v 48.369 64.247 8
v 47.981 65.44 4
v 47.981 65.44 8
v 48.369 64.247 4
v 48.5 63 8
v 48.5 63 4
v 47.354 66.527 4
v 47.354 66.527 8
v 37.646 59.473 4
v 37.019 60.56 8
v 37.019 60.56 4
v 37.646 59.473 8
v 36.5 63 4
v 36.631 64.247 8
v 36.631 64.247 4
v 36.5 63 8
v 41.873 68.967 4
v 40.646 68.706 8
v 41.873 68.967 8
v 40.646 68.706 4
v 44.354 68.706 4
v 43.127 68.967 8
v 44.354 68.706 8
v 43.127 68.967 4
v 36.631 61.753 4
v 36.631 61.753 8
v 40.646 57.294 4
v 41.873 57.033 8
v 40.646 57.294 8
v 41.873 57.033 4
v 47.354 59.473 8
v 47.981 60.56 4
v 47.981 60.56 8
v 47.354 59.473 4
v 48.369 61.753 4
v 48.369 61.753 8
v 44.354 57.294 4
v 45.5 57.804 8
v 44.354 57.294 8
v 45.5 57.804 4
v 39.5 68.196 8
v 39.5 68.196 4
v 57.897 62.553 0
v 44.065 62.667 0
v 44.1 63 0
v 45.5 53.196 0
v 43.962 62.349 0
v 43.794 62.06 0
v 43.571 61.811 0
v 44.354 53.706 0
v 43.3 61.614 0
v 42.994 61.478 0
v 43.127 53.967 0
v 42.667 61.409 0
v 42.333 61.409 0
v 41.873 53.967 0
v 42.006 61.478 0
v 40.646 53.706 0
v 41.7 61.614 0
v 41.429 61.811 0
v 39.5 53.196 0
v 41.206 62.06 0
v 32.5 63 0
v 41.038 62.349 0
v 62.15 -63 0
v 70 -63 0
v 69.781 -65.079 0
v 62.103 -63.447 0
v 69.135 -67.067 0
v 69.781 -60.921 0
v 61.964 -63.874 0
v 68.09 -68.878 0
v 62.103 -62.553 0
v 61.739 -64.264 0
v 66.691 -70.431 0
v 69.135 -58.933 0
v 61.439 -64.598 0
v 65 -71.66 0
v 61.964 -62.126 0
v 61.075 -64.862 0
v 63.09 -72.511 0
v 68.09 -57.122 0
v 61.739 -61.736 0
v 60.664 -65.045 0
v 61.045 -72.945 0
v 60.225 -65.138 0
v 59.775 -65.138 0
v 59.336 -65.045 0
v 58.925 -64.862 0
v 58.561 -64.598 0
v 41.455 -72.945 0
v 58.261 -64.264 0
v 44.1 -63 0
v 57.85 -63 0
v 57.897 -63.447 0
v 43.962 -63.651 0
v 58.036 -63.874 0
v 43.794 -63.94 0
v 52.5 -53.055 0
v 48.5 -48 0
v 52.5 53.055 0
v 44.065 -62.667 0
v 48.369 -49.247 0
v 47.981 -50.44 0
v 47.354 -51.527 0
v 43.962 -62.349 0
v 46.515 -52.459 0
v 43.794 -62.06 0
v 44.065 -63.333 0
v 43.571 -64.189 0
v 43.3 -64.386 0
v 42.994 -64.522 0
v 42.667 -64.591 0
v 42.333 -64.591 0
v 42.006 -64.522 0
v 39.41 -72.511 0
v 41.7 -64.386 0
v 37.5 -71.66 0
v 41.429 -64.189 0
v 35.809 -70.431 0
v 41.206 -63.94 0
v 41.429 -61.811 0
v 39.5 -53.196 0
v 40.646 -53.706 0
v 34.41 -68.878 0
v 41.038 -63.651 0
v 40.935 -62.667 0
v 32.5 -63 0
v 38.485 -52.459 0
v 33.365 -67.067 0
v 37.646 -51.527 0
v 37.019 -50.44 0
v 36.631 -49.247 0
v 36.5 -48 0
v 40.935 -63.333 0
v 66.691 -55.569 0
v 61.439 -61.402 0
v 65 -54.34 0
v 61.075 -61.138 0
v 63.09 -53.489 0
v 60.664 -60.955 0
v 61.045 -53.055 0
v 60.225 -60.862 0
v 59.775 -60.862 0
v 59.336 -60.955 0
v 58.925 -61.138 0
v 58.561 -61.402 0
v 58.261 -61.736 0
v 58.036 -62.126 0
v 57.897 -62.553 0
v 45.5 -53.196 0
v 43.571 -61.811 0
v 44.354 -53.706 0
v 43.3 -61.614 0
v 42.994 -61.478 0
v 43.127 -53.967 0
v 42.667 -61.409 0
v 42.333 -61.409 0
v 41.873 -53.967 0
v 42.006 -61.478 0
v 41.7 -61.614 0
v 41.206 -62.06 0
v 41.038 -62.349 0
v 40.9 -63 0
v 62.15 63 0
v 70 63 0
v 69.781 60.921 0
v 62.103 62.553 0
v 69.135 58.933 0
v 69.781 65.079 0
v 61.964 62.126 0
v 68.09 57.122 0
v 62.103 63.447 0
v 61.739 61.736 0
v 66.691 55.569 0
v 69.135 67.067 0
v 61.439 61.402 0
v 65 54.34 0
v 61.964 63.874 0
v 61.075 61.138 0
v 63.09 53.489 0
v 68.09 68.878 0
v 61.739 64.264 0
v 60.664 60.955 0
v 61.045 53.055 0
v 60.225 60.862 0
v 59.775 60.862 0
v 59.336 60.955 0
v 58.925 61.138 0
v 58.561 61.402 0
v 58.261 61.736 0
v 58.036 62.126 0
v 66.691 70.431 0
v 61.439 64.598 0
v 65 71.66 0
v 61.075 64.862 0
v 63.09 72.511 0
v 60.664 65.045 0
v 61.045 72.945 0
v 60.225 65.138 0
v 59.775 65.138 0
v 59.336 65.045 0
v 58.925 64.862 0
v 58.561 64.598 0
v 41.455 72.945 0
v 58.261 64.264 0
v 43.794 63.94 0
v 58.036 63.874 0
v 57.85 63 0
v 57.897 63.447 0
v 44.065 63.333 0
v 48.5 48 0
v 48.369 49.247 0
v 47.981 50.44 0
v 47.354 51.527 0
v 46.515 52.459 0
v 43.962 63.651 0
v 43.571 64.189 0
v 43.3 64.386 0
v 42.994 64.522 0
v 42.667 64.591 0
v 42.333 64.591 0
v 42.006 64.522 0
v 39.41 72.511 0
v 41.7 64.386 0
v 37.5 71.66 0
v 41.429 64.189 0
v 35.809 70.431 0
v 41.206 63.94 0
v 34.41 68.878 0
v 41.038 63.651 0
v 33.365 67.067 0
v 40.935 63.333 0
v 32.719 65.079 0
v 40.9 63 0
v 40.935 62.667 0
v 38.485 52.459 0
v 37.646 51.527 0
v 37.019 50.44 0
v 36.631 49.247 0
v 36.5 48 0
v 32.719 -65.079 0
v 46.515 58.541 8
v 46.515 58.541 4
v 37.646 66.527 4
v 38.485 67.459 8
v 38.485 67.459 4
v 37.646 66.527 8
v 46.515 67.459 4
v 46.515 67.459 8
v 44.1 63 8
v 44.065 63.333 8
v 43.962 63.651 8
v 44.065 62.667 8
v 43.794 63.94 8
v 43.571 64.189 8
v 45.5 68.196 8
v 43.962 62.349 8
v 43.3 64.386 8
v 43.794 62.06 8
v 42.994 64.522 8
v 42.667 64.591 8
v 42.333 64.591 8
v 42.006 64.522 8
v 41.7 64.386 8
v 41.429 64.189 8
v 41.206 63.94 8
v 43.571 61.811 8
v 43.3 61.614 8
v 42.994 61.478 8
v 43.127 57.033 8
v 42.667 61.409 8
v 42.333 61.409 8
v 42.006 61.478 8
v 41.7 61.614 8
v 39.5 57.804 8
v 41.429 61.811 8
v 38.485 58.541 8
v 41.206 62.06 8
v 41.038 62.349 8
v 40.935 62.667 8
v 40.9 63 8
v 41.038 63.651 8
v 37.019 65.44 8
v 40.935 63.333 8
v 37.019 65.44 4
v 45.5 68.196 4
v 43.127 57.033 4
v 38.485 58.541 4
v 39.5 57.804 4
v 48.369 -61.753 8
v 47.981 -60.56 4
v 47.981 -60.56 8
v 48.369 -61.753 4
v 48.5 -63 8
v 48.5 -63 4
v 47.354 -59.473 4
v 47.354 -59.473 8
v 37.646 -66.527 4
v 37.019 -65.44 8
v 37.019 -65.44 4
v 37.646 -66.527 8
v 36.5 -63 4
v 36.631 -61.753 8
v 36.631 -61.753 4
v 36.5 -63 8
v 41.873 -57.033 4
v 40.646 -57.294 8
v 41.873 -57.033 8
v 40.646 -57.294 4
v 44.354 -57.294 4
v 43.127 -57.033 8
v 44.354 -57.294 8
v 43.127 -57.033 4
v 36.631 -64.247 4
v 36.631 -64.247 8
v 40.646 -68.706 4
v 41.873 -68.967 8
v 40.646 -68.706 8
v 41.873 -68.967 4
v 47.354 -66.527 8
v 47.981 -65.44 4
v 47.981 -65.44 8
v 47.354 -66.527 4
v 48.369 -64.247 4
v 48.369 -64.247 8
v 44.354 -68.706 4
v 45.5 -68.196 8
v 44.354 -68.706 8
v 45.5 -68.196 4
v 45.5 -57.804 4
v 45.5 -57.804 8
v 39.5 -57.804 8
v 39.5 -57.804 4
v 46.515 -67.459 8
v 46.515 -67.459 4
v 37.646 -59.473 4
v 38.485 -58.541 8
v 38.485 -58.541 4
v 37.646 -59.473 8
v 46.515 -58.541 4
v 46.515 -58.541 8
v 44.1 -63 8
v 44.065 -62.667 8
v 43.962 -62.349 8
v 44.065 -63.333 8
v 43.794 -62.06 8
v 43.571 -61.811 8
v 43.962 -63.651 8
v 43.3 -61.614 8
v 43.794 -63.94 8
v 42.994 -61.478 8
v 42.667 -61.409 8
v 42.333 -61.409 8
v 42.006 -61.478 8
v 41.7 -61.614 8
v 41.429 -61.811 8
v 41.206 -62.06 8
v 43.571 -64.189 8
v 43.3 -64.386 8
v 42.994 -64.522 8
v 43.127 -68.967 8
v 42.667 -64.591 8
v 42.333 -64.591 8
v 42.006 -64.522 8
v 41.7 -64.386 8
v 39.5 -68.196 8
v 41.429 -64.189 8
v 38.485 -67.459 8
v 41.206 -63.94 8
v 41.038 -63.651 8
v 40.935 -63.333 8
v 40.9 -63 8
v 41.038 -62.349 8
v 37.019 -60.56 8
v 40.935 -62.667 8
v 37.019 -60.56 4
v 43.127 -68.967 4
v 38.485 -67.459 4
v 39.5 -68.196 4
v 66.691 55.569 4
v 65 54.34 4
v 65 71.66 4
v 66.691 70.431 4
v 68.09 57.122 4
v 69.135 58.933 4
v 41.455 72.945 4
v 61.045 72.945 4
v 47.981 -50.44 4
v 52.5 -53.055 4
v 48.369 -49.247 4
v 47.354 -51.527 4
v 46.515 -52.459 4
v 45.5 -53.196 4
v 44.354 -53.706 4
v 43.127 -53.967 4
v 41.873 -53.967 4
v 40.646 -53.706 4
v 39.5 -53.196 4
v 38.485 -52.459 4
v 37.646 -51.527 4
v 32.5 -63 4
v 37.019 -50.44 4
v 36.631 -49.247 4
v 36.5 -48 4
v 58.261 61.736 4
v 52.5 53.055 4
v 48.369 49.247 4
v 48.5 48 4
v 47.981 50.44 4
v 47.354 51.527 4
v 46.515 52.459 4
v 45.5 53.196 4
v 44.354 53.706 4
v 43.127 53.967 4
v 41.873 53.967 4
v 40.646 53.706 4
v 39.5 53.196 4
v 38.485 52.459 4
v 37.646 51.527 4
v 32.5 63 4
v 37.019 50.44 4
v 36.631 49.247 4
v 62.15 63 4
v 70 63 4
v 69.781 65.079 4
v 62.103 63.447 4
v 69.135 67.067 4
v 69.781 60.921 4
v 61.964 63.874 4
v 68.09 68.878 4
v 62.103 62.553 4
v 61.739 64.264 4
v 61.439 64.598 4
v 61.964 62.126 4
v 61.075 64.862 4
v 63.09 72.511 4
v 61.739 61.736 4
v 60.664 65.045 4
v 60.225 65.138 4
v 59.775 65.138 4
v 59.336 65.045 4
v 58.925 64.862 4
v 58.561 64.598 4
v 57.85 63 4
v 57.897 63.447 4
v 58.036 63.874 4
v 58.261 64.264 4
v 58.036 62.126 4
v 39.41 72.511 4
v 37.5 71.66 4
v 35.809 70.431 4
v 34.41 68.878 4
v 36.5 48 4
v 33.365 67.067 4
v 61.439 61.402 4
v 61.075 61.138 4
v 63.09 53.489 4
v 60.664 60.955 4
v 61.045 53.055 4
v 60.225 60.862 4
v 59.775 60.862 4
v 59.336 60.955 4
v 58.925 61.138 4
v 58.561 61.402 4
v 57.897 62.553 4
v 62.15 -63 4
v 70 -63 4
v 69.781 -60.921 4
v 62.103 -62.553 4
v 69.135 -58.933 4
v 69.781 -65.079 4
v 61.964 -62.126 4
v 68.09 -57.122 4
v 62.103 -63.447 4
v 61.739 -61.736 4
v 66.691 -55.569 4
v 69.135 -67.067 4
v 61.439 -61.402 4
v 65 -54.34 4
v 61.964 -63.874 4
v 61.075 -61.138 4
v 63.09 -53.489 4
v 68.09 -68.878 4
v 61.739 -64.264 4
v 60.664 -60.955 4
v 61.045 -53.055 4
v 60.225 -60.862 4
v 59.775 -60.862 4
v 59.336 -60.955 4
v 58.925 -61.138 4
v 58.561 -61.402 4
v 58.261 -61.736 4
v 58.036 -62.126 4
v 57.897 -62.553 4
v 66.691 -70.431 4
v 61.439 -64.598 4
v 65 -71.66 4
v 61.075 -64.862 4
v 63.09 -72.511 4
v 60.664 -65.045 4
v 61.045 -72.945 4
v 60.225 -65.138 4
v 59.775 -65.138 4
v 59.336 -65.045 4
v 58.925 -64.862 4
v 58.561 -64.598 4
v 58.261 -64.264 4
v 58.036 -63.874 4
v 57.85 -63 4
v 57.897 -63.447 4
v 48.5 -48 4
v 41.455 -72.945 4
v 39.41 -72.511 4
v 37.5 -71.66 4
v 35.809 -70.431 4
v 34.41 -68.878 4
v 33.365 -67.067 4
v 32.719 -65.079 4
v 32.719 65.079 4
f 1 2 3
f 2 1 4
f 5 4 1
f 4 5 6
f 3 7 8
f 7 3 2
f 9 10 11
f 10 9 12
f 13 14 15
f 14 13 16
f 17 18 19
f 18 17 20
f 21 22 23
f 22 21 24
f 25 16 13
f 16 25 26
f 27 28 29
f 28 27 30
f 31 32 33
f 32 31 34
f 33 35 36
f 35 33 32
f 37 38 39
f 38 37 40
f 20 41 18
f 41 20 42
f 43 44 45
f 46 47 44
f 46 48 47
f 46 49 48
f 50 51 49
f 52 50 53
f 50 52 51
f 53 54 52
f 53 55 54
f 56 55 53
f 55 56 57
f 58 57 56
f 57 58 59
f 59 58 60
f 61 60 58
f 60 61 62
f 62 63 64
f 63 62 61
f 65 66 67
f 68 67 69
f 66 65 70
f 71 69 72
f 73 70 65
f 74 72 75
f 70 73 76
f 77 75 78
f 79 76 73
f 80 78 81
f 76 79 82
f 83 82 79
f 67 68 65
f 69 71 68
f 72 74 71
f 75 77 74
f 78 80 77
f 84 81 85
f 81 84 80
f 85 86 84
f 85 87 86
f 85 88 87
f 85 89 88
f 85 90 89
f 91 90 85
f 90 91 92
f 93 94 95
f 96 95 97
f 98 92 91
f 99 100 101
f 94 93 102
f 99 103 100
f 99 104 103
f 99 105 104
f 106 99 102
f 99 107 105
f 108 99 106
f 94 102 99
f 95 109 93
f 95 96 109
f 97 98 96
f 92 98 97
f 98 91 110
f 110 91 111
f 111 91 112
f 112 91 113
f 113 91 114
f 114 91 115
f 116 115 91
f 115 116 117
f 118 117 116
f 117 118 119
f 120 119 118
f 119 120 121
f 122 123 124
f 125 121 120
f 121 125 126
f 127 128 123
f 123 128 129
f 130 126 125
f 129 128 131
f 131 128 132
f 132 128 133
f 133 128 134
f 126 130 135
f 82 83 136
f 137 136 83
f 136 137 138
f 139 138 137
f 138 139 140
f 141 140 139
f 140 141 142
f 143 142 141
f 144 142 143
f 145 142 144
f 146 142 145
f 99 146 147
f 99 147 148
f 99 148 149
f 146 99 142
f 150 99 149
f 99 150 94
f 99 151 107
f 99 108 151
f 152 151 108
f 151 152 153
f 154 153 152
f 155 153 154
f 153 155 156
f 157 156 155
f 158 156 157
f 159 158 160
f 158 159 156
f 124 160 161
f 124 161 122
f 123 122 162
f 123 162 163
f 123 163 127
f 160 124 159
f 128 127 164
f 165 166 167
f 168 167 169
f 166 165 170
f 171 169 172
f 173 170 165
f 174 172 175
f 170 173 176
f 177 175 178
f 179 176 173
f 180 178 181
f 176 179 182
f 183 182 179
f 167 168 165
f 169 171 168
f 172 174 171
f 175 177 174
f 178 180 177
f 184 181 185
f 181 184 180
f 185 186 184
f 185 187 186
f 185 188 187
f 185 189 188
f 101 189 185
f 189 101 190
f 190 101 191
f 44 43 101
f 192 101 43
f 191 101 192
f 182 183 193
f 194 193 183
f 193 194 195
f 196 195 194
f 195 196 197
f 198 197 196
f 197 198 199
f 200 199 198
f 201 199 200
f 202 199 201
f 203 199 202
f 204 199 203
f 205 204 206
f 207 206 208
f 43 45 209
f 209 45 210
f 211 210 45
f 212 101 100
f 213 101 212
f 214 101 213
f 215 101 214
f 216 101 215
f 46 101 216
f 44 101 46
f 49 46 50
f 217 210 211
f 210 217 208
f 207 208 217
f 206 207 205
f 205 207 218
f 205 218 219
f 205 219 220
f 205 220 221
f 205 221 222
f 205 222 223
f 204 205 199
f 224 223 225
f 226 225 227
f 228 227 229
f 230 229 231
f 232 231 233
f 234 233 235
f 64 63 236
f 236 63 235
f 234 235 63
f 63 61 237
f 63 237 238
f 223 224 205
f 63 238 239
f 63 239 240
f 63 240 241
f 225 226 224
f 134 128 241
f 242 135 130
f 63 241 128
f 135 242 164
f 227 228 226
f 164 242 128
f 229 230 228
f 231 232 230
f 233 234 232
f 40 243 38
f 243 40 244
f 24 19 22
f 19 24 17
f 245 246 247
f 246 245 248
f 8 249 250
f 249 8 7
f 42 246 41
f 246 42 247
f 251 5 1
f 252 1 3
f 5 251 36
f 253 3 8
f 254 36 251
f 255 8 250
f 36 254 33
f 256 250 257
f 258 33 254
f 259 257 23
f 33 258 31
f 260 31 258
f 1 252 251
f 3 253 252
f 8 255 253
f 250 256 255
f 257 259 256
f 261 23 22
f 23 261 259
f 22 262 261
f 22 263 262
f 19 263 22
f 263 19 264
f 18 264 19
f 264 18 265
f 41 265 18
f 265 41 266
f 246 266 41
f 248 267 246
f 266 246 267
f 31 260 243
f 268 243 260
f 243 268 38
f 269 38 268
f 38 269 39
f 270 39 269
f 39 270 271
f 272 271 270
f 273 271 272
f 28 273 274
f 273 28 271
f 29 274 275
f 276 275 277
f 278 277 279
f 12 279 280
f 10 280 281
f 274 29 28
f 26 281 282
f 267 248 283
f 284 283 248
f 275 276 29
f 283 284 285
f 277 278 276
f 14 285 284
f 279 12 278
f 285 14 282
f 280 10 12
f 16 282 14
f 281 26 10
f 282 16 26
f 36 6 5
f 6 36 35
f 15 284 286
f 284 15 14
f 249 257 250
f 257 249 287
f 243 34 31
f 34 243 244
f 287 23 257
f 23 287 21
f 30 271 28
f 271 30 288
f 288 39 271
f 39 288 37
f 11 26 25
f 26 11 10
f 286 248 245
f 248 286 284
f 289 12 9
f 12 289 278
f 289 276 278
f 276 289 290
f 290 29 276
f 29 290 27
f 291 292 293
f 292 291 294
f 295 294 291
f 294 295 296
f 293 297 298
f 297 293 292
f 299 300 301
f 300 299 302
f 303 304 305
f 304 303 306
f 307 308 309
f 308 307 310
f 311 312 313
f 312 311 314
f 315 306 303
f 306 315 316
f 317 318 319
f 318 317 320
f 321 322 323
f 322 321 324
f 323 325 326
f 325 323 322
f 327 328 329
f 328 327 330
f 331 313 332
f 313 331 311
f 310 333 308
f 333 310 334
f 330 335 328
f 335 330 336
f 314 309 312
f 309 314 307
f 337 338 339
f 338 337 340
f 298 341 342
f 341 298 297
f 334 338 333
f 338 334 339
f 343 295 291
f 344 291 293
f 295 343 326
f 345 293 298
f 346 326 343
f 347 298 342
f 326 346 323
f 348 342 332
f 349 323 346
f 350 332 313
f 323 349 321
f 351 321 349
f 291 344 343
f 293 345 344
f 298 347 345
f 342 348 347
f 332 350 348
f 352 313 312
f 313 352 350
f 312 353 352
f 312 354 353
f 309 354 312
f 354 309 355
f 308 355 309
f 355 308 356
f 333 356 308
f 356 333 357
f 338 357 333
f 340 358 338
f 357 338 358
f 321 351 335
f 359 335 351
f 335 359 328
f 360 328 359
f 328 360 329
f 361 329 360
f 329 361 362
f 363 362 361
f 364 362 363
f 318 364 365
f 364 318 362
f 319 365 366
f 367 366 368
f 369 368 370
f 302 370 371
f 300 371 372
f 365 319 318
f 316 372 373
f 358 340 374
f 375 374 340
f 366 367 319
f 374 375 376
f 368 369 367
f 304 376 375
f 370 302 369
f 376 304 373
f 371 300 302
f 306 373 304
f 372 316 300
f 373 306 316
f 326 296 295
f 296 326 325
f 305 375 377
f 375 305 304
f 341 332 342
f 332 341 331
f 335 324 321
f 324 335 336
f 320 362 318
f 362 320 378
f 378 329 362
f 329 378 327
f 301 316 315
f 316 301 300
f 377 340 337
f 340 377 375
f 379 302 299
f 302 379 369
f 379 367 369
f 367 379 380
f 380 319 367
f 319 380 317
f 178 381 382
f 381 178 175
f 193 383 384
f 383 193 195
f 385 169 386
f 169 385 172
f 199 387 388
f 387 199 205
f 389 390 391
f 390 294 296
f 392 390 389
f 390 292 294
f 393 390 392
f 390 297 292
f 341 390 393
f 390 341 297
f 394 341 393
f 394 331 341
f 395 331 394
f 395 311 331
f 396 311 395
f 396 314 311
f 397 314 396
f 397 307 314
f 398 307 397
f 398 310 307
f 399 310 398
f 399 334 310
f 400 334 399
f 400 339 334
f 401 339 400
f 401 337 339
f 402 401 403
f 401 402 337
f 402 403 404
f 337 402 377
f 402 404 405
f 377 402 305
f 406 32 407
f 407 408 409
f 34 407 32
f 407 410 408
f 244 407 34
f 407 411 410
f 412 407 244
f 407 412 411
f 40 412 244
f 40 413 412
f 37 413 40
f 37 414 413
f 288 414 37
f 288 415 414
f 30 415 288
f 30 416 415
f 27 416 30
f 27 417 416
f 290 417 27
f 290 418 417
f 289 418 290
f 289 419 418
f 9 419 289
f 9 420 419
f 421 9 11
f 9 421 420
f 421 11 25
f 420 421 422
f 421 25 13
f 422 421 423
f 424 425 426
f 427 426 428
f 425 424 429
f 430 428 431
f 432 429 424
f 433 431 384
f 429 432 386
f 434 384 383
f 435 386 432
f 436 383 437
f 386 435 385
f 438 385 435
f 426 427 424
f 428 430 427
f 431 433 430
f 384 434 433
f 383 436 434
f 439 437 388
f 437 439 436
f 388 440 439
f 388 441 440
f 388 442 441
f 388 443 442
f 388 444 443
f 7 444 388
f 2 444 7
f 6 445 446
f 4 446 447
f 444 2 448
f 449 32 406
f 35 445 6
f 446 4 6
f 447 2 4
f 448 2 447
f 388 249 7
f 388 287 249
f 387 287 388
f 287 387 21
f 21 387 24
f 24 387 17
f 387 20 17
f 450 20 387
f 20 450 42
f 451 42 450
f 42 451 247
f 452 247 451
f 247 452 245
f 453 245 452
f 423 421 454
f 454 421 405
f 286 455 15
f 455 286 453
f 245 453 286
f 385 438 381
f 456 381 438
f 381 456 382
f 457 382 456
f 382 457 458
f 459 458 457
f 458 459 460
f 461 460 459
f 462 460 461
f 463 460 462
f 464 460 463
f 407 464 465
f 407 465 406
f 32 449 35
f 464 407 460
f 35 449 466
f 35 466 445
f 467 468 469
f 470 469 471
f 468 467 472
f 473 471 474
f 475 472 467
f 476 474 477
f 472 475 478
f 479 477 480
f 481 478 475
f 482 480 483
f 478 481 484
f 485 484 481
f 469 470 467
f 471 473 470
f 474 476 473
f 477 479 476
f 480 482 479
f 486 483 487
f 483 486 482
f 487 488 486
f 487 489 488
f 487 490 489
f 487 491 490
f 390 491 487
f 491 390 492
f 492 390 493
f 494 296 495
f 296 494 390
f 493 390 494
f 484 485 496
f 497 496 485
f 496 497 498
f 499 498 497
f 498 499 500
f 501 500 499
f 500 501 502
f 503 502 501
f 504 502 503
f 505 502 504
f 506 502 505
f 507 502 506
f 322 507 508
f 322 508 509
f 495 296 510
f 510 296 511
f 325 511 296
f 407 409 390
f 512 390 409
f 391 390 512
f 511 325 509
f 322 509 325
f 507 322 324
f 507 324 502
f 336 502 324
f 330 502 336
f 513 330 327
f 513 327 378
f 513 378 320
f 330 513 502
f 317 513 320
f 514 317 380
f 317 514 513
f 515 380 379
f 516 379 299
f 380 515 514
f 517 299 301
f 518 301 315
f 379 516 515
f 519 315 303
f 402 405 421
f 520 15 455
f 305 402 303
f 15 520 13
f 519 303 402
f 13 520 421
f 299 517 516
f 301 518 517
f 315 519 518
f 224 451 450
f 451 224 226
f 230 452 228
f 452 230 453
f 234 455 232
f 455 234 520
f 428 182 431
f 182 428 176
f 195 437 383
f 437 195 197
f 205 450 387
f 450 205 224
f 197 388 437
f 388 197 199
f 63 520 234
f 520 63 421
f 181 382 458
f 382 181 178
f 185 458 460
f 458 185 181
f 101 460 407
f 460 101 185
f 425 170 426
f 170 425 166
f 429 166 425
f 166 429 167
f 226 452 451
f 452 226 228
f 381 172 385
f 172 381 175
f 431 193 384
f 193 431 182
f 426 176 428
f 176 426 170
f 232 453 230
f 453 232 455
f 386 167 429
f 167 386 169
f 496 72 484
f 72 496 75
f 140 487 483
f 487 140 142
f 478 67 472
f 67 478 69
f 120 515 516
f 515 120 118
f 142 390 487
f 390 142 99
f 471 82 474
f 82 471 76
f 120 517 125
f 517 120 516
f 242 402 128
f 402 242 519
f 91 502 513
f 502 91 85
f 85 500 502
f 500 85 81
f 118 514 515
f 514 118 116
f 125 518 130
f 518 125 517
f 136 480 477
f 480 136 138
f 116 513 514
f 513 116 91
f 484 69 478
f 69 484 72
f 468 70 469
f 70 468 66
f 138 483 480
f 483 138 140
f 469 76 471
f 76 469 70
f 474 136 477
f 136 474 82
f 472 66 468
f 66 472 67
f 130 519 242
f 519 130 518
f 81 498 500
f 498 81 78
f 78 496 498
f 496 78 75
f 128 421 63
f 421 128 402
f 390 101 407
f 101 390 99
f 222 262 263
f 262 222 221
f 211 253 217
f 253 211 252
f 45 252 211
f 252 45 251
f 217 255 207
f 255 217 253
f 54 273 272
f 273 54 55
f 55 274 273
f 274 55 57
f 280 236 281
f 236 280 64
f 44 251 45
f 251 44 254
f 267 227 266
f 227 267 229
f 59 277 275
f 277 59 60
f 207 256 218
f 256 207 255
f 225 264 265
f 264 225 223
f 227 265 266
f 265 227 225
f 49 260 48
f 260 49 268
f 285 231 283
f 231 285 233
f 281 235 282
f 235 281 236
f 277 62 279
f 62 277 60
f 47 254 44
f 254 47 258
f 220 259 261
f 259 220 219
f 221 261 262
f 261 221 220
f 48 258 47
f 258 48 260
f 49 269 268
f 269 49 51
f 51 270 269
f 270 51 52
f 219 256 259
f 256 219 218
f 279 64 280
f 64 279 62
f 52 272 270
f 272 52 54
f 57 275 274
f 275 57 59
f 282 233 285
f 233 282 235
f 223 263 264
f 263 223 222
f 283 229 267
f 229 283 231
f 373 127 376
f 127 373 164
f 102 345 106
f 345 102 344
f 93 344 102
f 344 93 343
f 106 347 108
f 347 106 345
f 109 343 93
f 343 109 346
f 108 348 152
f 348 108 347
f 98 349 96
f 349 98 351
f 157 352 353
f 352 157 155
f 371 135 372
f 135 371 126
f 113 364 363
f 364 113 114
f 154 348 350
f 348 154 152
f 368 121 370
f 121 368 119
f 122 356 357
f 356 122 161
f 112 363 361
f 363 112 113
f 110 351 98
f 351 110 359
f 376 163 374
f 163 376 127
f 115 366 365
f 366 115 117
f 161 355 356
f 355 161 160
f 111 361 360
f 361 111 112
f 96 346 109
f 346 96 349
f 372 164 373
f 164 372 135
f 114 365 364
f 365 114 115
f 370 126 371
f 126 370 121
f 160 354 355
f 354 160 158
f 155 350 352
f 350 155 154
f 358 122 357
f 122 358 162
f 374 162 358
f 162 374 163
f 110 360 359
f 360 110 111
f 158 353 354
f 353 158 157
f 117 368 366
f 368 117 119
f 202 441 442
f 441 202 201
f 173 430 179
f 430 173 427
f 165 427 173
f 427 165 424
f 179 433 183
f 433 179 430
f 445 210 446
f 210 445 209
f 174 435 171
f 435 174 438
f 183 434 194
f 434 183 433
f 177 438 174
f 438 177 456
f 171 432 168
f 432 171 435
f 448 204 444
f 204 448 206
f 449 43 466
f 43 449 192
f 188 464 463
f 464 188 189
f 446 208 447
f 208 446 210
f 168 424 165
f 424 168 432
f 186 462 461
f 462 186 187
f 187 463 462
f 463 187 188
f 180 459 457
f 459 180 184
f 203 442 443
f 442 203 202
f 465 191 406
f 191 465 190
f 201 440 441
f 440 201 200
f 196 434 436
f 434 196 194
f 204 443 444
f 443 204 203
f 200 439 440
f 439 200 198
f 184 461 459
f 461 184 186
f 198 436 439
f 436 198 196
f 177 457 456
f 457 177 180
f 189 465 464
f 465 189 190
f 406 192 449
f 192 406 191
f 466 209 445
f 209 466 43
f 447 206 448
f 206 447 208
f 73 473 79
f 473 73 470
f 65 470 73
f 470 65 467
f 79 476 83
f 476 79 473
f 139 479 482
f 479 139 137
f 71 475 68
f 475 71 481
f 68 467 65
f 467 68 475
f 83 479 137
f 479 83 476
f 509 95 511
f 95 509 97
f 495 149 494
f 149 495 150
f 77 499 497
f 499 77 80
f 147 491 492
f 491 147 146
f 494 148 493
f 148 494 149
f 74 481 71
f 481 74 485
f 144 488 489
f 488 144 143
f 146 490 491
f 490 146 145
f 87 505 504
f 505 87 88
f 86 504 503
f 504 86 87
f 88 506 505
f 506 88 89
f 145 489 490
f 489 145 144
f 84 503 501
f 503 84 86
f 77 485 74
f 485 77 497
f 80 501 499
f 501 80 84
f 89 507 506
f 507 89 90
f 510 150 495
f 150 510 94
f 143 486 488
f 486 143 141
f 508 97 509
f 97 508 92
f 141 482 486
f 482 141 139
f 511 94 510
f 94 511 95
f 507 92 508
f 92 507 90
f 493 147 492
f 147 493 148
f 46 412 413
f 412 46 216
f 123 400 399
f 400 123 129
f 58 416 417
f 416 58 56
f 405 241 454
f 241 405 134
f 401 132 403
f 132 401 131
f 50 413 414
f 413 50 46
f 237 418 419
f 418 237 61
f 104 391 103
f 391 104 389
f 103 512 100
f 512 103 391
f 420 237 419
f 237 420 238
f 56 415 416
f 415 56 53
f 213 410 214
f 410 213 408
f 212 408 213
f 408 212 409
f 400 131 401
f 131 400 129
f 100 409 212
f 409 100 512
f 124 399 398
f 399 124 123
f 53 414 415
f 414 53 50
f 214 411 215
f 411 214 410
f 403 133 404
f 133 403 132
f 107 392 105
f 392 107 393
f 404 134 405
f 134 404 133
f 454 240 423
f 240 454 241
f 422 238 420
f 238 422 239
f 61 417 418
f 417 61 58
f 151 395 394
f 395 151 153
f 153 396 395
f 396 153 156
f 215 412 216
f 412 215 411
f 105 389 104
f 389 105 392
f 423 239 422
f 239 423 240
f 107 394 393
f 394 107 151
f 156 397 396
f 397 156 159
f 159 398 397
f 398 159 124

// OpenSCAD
// file: ../components/2040.scad
module outer_shape(h=10){
	hull(){
		translate([18.6,8.6,-h/2]) cylinder(r=1.4,h=h,$fn=30);
		translate([18.6,-8.6,-h/2]) cylinder(r=1.4,h=h,$fn=30);
		translate([-18.6,8.6,-h/2]) cylinder(r=1.4,h=h,$fn=30);
		translate([-18.6,-8.6,-h/2]) cylinder(r=1.4,h=h,$fn=30);
	}
}

module extrusion_2040(h=10){
	difference(){
		union(){
			difference(){
				outer_shape(h=h);
				cube([37.2,17.2,h+0.1],center=true);
				
				// Nut
				cube([40.1,6,h+0.1],center=true);
				translate([10,0,0]) cube([6,20.1,h+0.1],center=true);
				translate([-10,0,0]) cube([6,20.1,h+0.1],center=true);

				// Nut Wide
				translate([-19.9,0,0])cube([0.5,6.8,h+0.1],center=true);
				translate([19.9,0,0])cube([0.5,6.8,h+0.1],center=true);
				translate([10,-9.9,0])cube([6.8,0.5,h+0.1],center=true);
				translate([10,9.9,0])cube([6.8,0.5,h+0.1],center=true);
				translate([-10,-9.9,0])cube([6.8,0.5,h+0.1],center=true);
				translate([-10,9.9,0])cube([6.8,0.5,h+0.1],center=true);
			}
			// Cross
			translate([-10,0,0]) rotate([0,0,45]) cube([26,1.5,h],center=true);
			translate([-10,0,0]) rotate([0,0,-45]) cube([26,1.5,h],center=true);
			translate([10,0,0]) rotate([0,0,45]) cube([26,1.5,h],center=true);
			translate([10,0,0]) rotate([0,0,-45]) cube([26,1.5,h],center=true);
			
			//Corner Cubes
			intersection(){
				union(){
					translate([18,8,0]) cube([4,4,h],center=true);
					translate([18,-8,0]) cube([4,4,h],center=true);
					translate([-18,8,0]) cube([4,4,h],center=true);
					translate([-18,-8,0]) cube([4,4,h],center=true);

					translate([2,8.5,0]) cube([4,3.5,h],center=true);
					translate([2,-8.5,0]) cube([4,3.5,h],center=true);
					translate([-2,8.5,0]) cube([4,3.5,h],center=true);
					translate([-2,-8.5,0]) cube([4,3.5,h],center=true);

				}
				outer_shape();
			}

			// Center Cube
			translate([10,0,0]) cube([9,9,h],center=true);
			translate([-10,0,0]) cube([9,9,h],center=true);
		}
		translate([10,0,-h/2-1]) cylinder(h+2,2.5,2.5,$fn=30);
		translate([-10,0,-h/2-1]) cylinder(h+2,2.5,2.5,$fn=30);
		cube([5,17,h+2],center=true);
	}


}

module beam_2040(h=10,clearance = 0){
	if(clearance > 0){
		outer_shape(h=h);
	} else {
		extrusion_2040(h);
	}
}
// file: configuration.scad
// OD = outside diameter, corner to corner.
m3_nut_od = 6.1;
m3_nut_radius = (m3_nut_od+0.2)/2;

m4_nut_od = 8.1;
m4_nut_radius = (m4_nut_od+0.2)/2;

// Major diameter of metric 3mm thread.
m3_major = 2.85;
m3_radius = m3_major/2;
m3_open_radius = 3.2/2;

m4_major = 3.85;
m4_radius = m4_major/2;
m4_open_radius = 4.3/2;

m8_major = 7.85;
m8_radius = m8_major/2;
m8_open_radius = 8.3/2;

// NEMA17 stepper motors.
motor_shaft_diameter = 5;
motor_shaft_radius = (motor_shaft_diameter+0.3)/2;

// Frame brackets.
thickness = 3.6;

tower_radius = 185;
tower_side = tower_radius*1.73205;
tower_h = tower_radius*1.5;
tower_height = 1000;
bearing_spacing = 39.8;
horizontal_beam_radius = (tower_radius+28.8)/2;
horizontal_beam_length = horizontal_beam_radius * 3.464101615138 - (41.35*2);

color_a = "GreenYellow";
color_b = "black";
color_c = "";
color_d = "Silver";
// main file
include <configuration.scad>
include <../components/2040.scad>

holes_spacing_h = 85;
holes_spacing_v = 126;

module holes(){
	translate([holes_spacing_h/2,holes_spacing_v/2,0]) cylinder(h=20,r=m3_open_radius,center=true,$fn=30);
	translate([holes_spacing_h/2,-holes_spacing_v/2,0]) cylinder(h=20,r=m3_open_radius,center=true,$fn=30);
	translate([60,holes_spacing_v/2,0]) cylinder(h=20,r=m4_open_radius,center=true,$fn=30);
	translate([60,-holes_spacing_v/2,0]) cylinder(h=20,r=m4_open_radius,center=true,$fn=30);
	hull(){
		translate([holes_spacing_h/2,holes_spacing_v/2-15,0]) cylinder(h=20,r=6,$fn=30,center=true);
		translate([holes_spacing_h/2,-holes_spacing_v/2+15,0]) cylinder(h=20,r=6,$fn=30,center=true);
	}
}

module plate(){
	union(){
		translate([holes_spacing_h/2,holes_spacing_v/2,0]) cylinder(h=8,r=6,$fn=30);
		translate([holes_spacing_h/2,-holes_spacing_v/2,0]) cylinder(h=8,r=6,$fn=30);
		hull(){
			translate([60,holes_spacing_v/2,0]) cylinder(h=4,r=10,$fn=30);
			translate([holes_spacing_h/2,holes_spacing_v/2,0]) cylinder(h=4,r=10,$fn=30);
		}
		hull(){
			translate([60,-holes_spacing_v/2,0]) cylinder(h=4,r=10,$fn=30);
			translate([holes_spacing_h/2,-holes_spacing_v/2,0]) cylinder(h=4,r=10,$fn=30);
		}
		hull(){
			translate([holes_spacing_h/2,holes_spacing_v/2,0]) cylinder(h=4,r=10,$fn=30);
			translate([holes_spacing_h/2,-holes_spacing_v/2,0]) cylinder(h=4,r=10,$fn=30);
		}
	}
}

module mount(){
	difference(){
		plate();
		holes();
	}
}

%color("Silver") translate([60,0,-20]) rotate([0,90,90]) beam_2040(h=200);
%color("Silver") translate([-60,0,-20]) rotate([0,90,90]) beam_2040(h=200);
mount();
%rotate([0,0,180]) mount();
